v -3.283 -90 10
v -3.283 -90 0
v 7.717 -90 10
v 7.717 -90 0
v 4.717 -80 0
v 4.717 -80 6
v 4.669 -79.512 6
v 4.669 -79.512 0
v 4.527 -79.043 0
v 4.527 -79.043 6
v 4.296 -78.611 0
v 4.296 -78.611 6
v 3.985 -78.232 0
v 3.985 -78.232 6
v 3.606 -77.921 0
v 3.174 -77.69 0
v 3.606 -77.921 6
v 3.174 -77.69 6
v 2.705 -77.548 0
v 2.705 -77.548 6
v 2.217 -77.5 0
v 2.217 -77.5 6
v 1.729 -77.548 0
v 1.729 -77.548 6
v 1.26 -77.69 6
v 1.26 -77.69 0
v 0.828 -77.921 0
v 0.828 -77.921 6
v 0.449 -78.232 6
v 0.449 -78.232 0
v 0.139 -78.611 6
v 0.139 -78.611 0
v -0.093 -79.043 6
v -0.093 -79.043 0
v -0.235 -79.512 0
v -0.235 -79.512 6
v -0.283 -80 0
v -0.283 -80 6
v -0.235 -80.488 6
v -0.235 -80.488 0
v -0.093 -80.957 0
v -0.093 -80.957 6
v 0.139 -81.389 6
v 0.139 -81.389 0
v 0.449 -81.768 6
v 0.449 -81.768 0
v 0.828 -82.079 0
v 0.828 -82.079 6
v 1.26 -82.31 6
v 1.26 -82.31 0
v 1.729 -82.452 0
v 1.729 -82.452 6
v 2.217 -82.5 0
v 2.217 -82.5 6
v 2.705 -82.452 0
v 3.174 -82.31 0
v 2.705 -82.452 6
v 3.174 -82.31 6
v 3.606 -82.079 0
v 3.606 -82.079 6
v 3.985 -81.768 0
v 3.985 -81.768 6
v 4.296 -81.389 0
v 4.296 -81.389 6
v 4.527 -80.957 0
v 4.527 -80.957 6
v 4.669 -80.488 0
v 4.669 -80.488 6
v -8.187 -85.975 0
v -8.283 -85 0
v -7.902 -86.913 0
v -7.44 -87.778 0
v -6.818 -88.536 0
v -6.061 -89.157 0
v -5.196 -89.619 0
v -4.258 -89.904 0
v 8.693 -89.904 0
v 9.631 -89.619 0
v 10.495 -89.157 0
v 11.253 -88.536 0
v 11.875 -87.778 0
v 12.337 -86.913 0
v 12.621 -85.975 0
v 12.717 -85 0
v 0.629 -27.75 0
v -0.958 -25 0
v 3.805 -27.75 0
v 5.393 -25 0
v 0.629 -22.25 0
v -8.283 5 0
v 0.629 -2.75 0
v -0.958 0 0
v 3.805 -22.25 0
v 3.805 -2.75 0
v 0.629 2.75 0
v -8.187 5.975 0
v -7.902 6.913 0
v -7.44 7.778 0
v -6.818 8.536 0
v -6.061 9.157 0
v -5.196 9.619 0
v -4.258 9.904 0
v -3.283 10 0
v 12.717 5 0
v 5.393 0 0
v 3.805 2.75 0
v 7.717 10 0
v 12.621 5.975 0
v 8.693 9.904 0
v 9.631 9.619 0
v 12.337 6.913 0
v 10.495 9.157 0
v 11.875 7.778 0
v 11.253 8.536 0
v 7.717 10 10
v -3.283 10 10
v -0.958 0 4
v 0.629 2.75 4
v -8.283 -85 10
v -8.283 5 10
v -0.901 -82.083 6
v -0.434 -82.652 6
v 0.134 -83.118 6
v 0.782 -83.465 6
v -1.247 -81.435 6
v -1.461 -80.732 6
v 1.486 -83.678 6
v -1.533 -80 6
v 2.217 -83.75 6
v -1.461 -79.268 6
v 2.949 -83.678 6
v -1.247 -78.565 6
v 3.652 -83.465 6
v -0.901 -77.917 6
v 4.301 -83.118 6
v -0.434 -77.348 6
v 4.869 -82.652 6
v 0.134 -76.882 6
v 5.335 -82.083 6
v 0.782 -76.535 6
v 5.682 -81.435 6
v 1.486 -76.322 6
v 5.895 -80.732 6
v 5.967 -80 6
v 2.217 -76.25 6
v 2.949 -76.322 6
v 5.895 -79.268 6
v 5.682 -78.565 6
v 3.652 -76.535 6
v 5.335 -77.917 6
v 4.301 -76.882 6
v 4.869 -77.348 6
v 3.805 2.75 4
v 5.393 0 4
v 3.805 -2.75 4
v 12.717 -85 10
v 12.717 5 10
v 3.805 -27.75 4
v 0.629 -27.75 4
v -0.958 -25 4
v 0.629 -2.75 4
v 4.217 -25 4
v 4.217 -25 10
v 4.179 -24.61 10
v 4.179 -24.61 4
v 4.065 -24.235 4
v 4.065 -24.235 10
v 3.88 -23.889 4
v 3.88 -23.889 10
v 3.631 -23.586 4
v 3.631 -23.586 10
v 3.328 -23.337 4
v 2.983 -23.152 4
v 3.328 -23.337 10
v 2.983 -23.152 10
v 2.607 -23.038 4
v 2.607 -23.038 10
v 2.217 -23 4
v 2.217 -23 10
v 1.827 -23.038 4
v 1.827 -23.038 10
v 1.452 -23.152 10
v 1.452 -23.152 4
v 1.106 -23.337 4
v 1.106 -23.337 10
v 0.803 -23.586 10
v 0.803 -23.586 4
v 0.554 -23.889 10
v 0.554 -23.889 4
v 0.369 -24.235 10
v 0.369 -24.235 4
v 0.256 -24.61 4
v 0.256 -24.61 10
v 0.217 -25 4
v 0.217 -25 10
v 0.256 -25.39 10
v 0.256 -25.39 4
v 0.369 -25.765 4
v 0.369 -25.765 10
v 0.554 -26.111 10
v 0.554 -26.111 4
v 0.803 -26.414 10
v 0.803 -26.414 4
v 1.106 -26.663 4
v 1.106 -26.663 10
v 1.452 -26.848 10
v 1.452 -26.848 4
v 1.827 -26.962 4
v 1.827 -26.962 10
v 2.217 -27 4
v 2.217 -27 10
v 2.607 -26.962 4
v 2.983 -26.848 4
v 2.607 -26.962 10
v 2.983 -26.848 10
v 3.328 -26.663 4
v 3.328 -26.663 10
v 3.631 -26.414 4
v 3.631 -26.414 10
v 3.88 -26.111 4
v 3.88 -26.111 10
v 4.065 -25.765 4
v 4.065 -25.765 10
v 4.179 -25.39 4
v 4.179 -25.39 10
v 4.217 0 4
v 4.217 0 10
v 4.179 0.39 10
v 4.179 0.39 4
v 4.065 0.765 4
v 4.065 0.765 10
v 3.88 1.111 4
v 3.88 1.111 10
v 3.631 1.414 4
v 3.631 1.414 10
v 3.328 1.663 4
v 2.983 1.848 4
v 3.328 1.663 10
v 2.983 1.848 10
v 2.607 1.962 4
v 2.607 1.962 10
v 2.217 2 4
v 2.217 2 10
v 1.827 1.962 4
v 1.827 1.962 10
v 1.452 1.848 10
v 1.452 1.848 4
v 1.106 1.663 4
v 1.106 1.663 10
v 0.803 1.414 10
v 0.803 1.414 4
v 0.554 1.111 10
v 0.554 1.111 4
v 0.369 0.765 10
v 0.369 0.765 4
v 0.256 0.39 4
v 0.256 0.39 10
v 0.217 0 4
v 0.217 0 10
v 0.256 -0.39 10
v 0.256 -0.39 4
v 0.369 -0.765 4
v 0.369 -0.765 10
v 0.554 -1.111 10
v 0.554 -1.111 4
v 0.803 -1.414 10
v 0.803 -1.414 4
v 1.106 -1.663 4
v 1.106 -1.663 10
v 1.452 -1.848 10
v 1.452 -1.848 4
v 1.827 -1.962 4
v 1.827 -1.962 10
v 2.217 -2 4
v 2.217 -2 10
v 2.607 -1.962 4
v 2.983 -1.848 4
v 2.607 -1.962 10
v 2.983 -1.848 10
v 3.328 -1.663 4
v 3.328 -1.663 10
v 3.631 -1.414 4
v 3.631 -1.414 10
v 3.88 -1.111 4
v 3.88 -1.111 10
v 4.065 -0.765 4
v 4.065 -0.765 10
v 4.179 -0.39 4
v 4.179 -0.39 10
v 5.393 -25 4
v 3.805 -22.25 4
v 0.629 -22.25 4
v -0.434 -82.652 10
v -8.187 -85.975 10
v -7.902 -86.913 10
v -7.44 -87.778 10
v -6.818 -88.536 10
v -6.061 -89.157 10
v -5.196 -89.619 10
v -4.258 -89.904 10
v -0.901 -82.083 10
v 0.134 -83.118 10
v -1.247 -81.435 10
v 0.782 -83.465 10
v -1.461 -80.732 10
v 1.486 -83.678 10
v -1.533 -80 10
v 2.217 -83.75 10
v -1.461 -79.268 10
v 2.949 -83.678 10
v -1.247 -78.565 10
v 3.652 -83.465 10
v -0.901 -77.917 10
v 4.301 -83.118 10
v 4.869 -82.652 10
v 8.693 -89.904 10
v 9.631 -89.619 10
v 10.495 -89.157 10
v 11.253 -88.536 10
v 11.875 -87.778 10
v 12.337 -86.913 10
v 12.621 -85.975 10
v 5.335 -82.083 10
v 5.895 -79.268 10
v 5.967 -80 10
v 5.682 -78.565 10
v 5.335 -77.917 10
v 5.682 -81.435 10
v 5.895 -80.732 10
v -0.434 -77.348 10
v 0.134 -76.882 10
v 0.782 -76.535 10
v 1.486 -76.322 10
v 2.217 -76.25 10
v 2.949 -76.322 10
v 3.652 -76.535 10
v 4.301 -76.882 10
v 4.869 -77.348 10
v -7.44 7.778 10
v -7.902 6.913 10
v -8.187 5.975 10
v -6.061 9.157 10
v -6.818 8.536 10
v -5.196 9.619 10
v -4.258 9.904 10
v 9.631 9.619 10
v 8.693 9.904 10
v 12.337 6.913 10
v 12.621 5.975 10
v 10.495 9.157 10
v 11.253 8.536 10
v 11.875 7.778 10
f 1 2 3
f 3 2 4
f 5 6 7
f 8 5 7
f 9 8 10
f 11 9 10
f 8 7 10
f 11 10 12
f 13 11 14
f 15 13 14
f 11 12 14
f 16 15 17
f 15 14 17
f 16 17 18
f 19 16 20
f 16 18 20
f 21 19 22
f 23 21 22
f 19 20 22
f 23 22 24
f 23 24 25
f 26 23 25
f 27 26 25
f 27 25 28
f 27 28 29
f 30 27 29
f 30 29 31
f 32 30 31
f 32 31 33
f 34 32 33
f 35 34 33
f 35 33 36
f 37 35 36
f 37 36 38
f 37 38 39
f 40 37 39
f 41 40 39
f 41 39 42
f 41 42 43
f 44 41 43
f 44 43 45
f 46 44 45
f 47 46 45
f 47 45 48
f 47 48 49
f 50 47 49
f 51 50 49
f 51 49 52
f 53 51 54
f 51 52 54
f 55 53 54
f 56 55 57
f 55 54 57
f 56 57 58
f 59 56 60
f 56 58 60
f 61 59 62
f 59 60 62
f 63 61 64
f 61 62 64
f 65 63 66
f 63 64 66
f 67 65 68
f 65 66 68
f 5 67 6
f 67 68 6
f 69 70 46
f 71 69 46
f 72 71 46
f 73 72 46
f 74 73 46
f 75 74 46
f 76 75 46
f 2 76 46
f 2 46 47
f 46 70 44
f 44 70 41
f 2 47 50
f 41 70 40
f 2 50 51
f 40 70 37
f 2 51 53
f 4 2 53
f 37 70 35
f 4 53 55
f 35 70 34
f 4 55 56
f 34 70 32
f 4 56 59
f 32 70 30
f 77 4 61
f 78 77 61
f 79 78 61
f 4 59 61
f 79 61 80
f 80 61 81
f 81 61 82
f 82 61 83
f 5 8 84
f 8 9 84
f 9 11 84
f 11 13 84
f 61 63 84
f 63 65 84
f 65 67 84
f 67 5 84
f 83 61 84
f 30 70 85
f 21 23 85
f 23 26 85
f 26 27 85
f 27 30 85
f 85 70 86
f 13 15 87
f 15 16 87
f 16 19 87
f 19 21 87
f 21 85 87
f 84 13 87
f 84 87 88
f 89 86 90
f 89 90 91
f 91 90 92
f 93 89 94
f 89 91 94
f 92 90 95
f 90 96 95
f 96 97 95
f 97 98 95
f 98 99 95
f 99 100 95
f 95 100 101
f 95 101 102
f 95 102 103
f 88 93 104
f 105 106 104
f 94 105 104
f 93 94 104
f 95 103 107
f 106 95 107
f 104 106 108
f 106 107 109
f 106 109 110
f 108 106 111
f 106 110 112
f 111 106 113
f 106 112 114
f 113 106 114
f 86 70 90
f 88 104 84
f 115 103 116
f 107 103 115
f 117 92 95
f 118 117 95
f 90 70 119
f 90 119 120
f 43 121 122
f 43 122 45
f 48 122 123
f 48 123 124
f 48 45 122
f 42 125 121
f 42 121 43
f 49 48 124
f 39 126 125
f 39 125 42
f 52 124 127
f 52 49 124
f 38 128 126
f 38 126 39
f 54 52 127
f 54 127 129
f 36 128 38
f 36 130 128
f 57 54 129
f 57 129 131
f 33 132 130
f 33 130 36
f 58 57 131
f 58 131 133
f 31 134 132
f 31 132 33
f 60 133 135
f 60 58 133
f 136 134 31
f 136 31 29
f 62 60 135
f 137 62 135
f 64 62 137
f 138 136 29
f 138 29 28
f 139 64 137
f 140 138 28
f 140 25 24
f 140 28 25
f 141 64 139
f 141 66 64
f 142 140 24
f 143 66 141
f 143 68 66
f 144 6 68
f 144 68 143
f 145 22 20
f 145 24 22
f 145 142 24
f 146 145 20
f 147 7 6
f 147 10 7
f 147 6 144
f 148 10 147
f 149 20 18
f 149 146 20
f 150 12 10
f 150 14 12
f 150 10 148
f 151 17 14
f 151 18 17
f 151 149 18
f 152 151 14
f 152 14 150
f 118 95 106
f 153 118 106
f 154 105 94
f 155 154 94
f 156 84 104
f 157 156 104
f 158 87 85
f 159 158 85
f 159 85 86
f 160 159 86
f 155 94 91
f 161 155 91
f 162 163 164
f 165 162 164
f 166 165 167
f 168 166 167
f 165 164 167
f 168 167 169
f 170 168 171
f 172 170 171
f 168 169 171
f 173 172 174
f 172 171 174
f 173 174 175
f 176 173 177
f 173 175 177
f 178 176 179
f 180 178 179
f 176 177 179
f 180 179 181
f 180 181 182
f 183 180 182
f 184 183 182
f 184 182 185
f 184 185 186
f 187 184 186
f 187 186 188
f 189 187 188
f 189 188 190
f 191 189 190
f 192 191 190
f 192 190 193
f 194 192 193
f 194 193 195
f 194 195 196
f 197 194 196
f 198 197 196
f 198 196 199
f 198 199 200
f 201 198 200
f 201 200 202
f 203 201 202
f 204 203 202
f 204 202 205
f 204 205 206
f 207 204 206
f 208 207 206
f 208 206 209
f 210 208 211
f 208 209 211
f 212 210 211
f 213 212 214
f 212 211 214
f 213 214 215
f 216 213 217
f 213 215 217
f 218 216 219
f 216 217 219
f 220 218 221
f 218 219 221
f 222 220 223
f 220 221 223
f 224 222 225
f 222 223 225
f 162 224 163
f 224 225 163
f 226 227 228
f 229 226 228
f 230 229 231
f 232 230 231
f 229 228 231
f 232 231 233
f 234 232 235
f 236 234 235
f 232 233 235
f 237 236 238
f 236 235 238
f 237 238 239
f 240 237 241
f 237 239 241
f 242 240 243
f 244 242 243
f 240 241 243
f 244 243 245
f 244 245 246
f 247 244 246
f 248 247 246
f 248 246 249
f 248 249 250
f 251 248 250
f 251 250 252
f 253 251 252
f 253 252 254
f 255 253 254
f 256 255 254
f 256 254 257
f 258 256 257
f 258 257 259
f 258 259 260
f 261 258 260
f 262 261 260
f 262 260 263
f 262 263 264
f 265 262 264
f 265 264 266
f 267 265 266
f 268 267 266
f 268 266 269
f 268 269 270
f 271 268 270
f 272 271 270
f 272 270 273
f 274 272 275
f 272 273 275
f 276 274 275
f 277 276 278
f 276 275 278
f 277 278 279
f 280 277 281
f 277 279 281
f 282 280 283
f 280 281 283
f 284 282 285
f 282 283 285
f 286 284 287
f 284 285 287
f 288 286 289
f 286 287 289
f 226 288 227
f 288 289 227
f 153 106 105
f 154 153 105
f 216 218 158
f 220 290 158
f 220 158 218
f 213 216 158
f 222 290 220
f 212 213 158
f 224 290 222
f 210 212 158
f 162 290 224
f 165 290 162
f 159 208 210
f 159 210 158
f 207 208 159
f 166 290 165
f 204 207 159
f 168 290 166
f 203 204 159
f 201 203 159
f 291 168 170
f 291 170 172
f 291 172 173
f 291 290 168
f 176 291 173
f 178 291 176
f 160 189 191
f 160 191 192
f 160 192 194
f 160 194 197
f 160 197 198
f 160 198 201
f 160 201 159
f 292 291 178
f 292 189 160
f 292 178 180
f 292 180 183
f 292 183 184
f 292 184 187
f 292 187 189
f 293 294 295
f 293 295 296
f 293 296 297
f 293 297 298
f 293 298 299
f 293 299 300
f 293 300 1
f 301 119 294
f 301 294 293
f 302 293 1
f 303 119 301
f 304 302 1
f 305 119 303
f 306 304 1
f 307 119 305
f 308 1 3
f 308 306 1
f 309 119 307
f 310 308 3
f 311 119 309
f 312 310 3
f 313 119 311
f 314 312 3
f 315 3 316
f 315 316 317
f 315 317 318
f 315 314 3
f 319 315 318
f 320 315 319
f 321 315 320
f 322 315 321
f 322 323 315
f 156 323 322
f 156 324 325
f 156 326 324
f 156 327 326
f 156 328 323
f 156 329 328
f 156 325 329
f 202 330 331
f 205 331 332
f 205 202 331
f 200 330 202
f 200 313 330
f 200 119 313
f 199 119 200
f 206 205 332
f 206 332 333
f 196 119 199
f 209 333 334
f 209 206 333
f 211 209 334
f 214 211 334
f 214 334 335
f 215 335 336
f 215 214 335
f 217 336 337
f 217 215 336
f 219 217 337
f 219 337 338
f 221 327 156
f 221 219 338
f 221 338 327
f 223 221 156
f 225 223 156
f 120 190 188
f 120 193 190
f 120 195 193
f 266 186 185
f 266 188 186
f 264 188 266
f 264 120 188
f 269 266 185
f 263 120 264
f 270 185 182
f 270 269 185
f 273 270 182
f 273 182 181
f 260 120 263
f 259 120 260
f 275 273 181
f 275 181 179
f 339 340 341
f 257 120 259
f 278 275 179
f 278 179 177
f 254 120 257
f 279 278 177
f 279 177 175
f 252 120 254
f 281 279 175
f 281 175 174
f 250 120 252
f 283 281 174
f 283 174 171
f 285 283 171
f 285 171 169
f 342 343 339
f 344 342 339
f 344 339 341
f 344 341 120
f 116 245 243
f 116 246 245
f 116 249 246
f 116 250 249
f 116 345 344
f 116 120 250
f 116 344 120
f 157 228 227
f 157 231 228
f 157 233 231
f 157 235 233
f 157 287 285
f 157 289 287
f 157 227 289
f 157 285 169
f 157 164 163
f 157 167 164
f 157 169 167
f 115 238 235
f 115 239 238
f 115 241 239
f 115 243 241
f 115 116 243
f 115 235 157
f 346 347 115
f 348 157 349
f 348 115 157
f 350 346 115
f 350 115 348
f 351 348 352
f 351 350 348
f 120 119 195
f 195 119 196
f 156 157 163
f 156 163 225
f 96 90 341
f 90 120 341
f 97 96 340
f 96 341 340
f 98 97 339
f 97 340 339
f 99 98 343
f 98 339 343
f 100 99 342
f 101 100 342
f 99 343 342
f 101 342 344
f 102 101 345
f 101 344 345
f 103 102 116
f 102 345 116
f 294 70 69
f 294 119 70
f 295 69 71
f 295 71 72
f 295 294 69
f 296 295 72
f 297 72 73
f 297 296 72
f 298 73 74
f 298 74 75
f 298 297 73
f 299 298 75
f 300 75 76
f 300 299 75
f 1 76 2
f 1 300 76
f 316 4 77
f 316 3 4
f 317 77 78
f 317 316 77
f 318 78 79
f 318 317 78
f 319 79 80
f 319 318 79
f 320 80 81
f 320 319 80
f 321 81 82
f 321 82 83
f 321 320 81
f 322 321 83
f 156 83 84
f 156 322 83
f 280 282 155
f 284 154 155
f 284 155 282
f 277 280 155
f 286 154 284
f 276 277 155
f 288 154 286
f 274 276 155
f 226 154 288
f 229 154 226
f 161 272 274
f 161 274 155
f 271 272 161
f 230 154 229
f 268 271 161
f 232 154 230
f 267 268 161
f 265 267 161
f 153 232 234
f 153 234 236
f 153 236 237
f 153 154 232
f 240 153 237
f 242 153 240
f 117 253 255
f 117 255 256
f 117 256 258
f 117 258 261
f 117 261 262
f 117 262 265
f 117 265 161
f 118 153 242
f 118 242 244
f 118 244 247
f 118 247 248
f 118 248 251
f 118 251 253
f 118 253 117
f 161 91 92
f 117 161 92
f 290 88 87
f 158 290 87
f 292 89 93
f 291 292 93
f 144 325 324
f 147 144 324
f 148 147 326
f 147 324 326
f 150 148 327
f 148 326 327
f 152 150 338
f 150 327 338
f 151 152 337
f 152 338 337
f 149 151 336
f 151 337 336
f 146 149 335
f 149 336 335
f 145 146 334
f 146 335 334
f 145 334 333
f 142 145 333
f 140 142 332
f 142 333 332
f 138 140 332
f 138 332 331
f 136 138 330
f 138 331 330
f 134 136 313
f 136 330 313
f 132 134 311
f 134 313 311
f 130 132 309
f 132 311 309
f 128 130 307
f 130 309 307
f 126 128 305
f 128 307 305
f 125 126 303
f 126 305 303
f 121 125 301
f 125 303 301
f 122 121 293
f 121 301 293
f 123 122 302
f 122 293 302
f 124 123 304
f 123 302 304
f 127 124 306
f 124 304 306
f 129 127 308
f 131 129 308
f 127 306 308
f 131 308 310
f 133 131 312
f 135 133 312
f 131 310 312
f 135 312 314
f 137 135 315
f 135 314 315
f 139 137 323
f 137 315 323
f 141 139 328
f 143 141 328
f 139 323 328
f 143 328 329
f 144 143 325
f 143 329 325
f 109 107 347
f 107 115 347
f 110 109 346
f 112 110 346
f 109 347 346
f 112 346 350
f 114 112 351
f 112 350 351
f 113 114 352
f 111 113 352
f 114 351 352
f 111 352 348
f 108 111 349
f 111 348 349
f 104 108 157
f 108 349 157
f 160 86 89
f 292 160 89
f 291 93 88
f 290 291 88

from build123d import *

# Parameters (mm, degrees)
ESQUISSE1_W             = 21
ESQUISSE1_H             = 100
BOSS_EXTRU_1_DEPTH      = 10
ESQUISSE2_R             = 2
ESQUISSE2_R_2           = 2.5
ENL_V_MAT_EXTRU_1_DEPTH = 10
CONG_1_R                = 5
ENL_V_MAT_EXTRU_2_DEPTH = 4
ESQUISSE4_R             = 3.75
ENL_V_MAT_EXTRU_4_DEPTH = 4


with BuildPart() as part:
    # Esquisse1 → Boss.-Extru.1 (new body)
    with BuildSketch(Plane.XY):
        with Locations((2.217198679, -40)):
            Rectangle(ESQUISSE1_W, ESQUISSE1_H)
    extrude(amount=BOSS_EXTRU_1_DEPTH)

    # Esquisse2 → Enlèv. mat.-Extru.1 (cut)
    with BuildSketch(Plane.XY.offset(10)):
        with Locations((2.217198679, 0)):
            Circle(ESQUISSE2_R)
        with Locations((2.217198679, -25)):
            Circle(ESQUISSE2_R)
        with Locations((2.217198679, -80)):
            Circle(ESQUISSE2_R_2)
    extrude(amount=-ENL_V_MAT_EXTRU_1_DEPTH, mode=Mode.SUBTRACT)

    # Congé1
    cong_1_edges = [part.edges().sort_by_distance(p)[0] for p in [
        (-8.282801321, 10, 5),
        (12.717198679, 10, 5),
        (12.717198679, -90, 5),
        (-8.282801321, -90, 5),
    ]]
    fillet(cong_1_edges, radius=CONG_1_R)

    # Esquisse3 → Enlèv. mat.-Extru.2 (cut)
    with BuildSketch(Plane(origin=(0, 0, 0), x_dir=(-1, 0, 0), z_dir=(0, 0, -1))):
        Polygon((-3.80491192, 2.75), (-5.39262516, 0), (-3.80491192, -2.75), (-0.629485439, -2.75), (0.958227801, 0), (-0.629485439, 2.75), align=None)
        Polygon((-3.80491192, -22.25), (-5.39262516, -25), (-3.80491192, -27.75), (-0.629485439, -27.75), (0.958227801, -25), (-0.629485439, -22.25), align=None)
    extrude(amount=-ENL_V_MAT_EXTRU_2_DEPTH, mode=Mode.SUBTRACT)

    # Esquisse4 → Enlèv. mat.-Extru.4 (cut)
    with BuildSketch(Plane.XY.offset(10)):
        with Locations((2.217198679, -80)):
            Circle(ESQUISSE4_R)
    extrude(amount=-ENL_V_MAT_EXTRU_4_DEPTH, mode=Mode.SUBTRACT)


solid = part.part
